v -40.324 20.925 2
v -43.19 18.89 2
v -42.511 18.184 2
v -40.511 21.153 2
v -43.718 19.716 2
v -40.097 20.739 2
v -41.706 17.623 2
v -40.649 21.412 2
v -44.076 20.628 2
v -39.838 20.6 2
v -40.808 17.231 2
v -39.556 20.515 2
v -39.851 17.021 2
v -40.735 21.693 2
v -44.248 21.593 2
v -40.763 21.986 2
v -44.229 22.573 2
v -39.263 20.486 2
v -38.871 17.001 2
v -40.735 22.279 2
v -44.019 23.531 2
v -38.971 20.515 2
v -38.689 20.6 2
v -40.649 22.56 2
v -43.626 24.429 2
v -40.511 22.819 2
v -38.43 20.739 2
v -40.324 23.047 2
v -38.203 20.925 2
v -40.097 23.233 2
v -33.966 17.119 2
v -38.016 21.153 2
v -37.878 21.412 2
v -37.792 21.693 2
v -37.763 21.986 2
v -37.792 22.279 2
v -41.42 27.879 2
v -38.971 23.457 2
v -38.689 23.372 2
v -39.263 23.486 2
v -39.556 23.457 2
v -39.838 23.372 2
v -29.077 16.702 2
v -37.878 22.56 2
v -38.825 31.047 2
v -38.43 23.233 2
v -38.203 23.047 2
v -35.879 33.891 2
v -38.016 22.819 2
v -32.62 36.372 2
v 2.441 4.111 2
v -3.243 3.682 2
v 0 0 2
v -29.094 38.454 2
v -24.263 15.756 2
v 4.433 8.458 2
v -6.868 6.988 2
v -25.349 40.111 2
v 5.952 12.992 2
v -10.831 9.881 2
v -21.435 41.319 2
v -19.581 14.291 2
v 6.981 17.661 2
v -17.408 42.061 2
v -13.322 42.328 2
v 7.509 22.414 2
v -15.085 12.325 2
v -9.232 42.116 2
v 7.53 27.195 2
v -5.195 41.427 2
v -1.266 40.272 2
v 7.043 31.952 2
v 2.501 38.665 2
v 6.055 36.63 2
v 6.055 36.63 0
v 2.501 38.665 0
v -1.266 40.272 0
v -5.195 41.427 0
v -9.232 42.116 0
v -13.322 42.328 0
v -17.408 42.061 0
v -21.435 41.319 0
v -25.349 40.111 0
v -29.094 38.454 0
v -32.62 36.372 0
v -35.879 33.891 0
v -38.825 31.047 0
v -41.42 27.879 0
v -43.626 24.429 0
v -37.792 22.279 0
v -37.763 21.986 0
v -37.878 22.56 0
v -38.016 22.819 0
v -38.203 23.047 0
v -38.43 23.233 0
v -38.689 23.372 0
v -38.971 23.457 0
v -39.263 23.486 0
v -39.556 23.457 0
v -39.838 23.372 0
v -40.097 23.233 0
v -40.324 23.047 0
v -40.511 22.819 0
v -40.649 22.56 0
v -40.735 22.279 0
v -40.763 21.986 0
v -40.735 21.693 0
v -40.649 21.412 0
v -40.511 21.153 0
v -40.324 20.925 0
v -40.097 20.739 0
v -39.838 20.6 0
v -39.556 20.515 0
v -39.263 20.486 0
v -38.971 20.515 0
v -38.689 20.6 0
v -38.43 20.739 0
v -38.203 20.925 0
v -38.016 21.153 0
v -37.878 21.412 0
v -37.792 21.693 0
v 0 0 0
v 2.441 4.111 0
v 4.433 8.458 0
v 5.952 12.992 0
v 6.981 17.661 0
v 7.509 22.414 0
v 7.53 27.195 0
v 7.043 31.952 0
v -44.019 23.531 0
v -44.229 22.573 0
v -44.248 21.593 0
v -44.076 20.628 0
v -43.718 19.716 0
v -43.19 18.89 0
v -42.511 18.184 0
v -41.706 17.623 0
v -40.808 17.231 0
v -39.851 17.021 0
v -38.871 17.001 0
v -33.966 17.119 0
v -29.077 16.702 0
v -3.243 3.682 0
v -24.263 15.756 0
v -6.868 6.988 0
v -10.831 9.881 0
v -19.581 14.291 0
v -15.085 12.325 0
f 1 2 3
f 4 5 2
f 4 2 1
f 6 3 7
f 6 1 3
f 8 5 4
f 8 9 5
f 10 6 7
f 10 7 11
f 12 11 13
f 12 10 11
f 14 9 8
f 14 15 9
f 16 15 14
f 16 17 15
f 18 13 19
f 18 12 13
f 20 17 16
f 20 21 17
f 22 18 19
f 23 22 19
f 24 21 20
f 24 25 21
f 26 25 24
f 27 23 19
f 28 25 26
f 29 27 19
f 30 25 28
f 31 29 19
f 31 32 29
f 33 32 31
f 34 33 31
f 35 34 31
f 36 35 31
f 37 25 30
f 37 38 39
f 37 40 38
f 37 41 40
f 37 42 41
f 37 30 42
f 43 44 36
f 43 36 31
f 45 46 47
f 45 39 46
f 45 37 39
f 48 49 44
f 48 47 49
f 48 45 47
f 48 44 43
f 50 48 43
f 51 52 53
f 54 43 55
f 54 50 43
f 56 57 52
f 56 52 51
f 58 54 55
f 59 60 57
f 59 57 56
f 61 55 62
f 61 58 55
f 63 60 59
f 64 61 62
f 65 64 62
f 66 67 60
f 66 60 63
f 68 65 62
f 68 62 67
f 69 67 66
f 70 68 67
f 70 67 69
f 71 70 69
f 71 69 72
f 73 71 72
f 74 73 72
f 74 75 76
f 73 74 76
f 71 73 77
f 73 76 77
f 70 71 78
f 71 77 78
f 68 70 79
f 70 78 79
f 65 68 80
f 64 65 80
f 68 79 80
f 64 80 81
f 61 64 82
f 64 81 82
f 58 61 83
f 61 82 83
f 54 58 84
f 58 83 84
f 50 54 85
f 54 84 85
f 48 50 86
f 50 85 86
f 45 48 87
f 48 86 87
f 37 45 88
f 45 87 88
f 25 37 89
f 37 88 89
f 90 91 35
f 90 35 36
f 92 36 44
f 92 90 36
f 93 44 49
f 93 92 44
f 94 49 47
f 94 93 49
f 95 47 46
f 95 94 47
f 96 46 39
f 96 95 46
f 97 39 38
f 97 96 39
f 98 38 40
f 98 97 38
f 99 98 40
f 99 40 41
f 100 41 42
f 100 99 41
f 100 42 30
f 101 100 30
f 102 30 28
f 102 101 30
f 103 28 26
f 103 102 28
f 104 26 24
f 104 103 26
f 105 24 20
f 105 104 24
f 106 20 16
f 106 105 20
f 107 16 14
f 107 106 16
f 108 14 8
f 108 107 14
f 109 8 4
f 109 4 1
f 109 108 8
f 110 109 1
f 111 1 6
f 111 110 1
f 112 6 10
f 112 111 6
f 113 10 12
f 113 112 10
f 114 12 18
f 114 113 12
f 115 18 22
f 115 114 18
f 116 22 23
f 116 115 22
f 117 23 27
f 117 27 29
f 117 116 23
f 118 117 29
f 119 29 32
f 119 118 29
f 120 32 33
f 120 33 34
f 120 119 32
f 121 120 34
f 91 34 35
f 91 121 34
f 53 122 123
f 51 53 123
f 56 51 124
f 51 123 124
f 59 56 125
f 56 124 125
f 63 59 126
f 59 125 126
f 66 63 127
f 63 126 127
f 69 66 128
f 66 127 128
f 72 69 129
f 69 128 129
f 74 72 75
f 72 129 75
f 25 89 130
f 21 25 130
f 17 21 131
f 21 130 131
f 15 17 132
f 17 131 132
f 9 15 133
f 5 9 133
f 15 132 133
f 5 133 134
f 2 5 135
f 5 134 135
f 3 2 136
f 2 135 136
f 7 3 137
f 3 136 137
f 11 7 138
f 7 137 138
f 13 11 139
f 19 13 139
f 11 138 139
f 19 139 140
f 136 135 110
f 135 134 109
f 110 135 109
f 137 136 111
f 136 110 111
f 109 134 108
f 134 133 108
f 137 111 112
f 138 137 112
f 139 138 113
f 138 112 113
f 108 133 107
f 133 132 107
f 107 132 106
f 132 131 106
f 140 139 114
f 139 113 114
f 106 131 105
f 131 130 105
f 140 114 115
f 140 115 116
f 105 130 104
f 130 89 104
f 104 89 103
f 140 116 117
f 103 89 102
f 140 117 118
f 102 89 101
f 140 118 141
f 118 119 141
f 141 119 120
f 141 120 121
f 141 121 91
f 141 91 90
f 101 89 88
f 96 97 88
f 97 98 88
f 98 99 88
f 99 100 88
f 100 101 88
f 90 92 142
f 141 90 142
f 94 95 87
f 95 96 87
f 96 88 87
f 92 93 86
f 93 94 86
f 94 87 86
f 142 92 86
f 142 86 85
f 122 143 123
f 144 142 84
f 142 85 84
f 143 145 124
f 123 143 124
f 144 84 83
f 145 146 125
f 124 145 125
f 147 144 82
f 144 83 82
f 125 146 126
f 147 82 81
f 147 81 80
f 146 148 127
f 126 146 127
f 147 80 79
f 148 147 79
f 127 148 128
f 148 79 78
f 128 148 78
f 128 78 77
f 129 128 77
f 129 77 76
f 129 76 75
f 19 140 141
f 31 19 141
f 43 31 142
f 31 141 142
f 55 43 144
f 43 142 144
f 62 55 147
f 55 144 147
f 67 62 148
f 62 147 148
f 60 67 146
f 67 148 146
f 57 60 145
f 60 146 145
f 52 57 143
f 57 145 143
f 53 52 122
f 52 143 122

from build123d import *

# Parameters (mm, degrees)
SKETCH_1_R      = 1.5
EXTRUDE_1_DEPTH = 2


with BuildPart() as part:
    # 草圖1 → 填料-伸長1 (new body)
    with BuildSketch(Plane.XY):
        with BuildLine():
            ThreePointArc((-38.871013222, 17.001303806), (-17.306164288, 13.369084026), (0, 0))
            ThreePointArc((0, 0), (6.981013161, 17.661453415), (6.054619156, 36.629934525))
            ThreePointArc((6.054619156, 36.629934525), (-21.435485662, 41.318574281), (-43.626094088, 24.428751802))
            ThreePointArc((-43.626094088, 24.428751802), (-43.474451881, 19.289999171), (-38.871013222, 17.001303806))
        make_face()
        with Locations((-39.263484679, 21.985876622)):
            Circle(SKETCH_1_R, mode=Mode.SUBTRACT)
    extrude(amount=EXTRUDE_1_DEPTH)


solid = part.part
